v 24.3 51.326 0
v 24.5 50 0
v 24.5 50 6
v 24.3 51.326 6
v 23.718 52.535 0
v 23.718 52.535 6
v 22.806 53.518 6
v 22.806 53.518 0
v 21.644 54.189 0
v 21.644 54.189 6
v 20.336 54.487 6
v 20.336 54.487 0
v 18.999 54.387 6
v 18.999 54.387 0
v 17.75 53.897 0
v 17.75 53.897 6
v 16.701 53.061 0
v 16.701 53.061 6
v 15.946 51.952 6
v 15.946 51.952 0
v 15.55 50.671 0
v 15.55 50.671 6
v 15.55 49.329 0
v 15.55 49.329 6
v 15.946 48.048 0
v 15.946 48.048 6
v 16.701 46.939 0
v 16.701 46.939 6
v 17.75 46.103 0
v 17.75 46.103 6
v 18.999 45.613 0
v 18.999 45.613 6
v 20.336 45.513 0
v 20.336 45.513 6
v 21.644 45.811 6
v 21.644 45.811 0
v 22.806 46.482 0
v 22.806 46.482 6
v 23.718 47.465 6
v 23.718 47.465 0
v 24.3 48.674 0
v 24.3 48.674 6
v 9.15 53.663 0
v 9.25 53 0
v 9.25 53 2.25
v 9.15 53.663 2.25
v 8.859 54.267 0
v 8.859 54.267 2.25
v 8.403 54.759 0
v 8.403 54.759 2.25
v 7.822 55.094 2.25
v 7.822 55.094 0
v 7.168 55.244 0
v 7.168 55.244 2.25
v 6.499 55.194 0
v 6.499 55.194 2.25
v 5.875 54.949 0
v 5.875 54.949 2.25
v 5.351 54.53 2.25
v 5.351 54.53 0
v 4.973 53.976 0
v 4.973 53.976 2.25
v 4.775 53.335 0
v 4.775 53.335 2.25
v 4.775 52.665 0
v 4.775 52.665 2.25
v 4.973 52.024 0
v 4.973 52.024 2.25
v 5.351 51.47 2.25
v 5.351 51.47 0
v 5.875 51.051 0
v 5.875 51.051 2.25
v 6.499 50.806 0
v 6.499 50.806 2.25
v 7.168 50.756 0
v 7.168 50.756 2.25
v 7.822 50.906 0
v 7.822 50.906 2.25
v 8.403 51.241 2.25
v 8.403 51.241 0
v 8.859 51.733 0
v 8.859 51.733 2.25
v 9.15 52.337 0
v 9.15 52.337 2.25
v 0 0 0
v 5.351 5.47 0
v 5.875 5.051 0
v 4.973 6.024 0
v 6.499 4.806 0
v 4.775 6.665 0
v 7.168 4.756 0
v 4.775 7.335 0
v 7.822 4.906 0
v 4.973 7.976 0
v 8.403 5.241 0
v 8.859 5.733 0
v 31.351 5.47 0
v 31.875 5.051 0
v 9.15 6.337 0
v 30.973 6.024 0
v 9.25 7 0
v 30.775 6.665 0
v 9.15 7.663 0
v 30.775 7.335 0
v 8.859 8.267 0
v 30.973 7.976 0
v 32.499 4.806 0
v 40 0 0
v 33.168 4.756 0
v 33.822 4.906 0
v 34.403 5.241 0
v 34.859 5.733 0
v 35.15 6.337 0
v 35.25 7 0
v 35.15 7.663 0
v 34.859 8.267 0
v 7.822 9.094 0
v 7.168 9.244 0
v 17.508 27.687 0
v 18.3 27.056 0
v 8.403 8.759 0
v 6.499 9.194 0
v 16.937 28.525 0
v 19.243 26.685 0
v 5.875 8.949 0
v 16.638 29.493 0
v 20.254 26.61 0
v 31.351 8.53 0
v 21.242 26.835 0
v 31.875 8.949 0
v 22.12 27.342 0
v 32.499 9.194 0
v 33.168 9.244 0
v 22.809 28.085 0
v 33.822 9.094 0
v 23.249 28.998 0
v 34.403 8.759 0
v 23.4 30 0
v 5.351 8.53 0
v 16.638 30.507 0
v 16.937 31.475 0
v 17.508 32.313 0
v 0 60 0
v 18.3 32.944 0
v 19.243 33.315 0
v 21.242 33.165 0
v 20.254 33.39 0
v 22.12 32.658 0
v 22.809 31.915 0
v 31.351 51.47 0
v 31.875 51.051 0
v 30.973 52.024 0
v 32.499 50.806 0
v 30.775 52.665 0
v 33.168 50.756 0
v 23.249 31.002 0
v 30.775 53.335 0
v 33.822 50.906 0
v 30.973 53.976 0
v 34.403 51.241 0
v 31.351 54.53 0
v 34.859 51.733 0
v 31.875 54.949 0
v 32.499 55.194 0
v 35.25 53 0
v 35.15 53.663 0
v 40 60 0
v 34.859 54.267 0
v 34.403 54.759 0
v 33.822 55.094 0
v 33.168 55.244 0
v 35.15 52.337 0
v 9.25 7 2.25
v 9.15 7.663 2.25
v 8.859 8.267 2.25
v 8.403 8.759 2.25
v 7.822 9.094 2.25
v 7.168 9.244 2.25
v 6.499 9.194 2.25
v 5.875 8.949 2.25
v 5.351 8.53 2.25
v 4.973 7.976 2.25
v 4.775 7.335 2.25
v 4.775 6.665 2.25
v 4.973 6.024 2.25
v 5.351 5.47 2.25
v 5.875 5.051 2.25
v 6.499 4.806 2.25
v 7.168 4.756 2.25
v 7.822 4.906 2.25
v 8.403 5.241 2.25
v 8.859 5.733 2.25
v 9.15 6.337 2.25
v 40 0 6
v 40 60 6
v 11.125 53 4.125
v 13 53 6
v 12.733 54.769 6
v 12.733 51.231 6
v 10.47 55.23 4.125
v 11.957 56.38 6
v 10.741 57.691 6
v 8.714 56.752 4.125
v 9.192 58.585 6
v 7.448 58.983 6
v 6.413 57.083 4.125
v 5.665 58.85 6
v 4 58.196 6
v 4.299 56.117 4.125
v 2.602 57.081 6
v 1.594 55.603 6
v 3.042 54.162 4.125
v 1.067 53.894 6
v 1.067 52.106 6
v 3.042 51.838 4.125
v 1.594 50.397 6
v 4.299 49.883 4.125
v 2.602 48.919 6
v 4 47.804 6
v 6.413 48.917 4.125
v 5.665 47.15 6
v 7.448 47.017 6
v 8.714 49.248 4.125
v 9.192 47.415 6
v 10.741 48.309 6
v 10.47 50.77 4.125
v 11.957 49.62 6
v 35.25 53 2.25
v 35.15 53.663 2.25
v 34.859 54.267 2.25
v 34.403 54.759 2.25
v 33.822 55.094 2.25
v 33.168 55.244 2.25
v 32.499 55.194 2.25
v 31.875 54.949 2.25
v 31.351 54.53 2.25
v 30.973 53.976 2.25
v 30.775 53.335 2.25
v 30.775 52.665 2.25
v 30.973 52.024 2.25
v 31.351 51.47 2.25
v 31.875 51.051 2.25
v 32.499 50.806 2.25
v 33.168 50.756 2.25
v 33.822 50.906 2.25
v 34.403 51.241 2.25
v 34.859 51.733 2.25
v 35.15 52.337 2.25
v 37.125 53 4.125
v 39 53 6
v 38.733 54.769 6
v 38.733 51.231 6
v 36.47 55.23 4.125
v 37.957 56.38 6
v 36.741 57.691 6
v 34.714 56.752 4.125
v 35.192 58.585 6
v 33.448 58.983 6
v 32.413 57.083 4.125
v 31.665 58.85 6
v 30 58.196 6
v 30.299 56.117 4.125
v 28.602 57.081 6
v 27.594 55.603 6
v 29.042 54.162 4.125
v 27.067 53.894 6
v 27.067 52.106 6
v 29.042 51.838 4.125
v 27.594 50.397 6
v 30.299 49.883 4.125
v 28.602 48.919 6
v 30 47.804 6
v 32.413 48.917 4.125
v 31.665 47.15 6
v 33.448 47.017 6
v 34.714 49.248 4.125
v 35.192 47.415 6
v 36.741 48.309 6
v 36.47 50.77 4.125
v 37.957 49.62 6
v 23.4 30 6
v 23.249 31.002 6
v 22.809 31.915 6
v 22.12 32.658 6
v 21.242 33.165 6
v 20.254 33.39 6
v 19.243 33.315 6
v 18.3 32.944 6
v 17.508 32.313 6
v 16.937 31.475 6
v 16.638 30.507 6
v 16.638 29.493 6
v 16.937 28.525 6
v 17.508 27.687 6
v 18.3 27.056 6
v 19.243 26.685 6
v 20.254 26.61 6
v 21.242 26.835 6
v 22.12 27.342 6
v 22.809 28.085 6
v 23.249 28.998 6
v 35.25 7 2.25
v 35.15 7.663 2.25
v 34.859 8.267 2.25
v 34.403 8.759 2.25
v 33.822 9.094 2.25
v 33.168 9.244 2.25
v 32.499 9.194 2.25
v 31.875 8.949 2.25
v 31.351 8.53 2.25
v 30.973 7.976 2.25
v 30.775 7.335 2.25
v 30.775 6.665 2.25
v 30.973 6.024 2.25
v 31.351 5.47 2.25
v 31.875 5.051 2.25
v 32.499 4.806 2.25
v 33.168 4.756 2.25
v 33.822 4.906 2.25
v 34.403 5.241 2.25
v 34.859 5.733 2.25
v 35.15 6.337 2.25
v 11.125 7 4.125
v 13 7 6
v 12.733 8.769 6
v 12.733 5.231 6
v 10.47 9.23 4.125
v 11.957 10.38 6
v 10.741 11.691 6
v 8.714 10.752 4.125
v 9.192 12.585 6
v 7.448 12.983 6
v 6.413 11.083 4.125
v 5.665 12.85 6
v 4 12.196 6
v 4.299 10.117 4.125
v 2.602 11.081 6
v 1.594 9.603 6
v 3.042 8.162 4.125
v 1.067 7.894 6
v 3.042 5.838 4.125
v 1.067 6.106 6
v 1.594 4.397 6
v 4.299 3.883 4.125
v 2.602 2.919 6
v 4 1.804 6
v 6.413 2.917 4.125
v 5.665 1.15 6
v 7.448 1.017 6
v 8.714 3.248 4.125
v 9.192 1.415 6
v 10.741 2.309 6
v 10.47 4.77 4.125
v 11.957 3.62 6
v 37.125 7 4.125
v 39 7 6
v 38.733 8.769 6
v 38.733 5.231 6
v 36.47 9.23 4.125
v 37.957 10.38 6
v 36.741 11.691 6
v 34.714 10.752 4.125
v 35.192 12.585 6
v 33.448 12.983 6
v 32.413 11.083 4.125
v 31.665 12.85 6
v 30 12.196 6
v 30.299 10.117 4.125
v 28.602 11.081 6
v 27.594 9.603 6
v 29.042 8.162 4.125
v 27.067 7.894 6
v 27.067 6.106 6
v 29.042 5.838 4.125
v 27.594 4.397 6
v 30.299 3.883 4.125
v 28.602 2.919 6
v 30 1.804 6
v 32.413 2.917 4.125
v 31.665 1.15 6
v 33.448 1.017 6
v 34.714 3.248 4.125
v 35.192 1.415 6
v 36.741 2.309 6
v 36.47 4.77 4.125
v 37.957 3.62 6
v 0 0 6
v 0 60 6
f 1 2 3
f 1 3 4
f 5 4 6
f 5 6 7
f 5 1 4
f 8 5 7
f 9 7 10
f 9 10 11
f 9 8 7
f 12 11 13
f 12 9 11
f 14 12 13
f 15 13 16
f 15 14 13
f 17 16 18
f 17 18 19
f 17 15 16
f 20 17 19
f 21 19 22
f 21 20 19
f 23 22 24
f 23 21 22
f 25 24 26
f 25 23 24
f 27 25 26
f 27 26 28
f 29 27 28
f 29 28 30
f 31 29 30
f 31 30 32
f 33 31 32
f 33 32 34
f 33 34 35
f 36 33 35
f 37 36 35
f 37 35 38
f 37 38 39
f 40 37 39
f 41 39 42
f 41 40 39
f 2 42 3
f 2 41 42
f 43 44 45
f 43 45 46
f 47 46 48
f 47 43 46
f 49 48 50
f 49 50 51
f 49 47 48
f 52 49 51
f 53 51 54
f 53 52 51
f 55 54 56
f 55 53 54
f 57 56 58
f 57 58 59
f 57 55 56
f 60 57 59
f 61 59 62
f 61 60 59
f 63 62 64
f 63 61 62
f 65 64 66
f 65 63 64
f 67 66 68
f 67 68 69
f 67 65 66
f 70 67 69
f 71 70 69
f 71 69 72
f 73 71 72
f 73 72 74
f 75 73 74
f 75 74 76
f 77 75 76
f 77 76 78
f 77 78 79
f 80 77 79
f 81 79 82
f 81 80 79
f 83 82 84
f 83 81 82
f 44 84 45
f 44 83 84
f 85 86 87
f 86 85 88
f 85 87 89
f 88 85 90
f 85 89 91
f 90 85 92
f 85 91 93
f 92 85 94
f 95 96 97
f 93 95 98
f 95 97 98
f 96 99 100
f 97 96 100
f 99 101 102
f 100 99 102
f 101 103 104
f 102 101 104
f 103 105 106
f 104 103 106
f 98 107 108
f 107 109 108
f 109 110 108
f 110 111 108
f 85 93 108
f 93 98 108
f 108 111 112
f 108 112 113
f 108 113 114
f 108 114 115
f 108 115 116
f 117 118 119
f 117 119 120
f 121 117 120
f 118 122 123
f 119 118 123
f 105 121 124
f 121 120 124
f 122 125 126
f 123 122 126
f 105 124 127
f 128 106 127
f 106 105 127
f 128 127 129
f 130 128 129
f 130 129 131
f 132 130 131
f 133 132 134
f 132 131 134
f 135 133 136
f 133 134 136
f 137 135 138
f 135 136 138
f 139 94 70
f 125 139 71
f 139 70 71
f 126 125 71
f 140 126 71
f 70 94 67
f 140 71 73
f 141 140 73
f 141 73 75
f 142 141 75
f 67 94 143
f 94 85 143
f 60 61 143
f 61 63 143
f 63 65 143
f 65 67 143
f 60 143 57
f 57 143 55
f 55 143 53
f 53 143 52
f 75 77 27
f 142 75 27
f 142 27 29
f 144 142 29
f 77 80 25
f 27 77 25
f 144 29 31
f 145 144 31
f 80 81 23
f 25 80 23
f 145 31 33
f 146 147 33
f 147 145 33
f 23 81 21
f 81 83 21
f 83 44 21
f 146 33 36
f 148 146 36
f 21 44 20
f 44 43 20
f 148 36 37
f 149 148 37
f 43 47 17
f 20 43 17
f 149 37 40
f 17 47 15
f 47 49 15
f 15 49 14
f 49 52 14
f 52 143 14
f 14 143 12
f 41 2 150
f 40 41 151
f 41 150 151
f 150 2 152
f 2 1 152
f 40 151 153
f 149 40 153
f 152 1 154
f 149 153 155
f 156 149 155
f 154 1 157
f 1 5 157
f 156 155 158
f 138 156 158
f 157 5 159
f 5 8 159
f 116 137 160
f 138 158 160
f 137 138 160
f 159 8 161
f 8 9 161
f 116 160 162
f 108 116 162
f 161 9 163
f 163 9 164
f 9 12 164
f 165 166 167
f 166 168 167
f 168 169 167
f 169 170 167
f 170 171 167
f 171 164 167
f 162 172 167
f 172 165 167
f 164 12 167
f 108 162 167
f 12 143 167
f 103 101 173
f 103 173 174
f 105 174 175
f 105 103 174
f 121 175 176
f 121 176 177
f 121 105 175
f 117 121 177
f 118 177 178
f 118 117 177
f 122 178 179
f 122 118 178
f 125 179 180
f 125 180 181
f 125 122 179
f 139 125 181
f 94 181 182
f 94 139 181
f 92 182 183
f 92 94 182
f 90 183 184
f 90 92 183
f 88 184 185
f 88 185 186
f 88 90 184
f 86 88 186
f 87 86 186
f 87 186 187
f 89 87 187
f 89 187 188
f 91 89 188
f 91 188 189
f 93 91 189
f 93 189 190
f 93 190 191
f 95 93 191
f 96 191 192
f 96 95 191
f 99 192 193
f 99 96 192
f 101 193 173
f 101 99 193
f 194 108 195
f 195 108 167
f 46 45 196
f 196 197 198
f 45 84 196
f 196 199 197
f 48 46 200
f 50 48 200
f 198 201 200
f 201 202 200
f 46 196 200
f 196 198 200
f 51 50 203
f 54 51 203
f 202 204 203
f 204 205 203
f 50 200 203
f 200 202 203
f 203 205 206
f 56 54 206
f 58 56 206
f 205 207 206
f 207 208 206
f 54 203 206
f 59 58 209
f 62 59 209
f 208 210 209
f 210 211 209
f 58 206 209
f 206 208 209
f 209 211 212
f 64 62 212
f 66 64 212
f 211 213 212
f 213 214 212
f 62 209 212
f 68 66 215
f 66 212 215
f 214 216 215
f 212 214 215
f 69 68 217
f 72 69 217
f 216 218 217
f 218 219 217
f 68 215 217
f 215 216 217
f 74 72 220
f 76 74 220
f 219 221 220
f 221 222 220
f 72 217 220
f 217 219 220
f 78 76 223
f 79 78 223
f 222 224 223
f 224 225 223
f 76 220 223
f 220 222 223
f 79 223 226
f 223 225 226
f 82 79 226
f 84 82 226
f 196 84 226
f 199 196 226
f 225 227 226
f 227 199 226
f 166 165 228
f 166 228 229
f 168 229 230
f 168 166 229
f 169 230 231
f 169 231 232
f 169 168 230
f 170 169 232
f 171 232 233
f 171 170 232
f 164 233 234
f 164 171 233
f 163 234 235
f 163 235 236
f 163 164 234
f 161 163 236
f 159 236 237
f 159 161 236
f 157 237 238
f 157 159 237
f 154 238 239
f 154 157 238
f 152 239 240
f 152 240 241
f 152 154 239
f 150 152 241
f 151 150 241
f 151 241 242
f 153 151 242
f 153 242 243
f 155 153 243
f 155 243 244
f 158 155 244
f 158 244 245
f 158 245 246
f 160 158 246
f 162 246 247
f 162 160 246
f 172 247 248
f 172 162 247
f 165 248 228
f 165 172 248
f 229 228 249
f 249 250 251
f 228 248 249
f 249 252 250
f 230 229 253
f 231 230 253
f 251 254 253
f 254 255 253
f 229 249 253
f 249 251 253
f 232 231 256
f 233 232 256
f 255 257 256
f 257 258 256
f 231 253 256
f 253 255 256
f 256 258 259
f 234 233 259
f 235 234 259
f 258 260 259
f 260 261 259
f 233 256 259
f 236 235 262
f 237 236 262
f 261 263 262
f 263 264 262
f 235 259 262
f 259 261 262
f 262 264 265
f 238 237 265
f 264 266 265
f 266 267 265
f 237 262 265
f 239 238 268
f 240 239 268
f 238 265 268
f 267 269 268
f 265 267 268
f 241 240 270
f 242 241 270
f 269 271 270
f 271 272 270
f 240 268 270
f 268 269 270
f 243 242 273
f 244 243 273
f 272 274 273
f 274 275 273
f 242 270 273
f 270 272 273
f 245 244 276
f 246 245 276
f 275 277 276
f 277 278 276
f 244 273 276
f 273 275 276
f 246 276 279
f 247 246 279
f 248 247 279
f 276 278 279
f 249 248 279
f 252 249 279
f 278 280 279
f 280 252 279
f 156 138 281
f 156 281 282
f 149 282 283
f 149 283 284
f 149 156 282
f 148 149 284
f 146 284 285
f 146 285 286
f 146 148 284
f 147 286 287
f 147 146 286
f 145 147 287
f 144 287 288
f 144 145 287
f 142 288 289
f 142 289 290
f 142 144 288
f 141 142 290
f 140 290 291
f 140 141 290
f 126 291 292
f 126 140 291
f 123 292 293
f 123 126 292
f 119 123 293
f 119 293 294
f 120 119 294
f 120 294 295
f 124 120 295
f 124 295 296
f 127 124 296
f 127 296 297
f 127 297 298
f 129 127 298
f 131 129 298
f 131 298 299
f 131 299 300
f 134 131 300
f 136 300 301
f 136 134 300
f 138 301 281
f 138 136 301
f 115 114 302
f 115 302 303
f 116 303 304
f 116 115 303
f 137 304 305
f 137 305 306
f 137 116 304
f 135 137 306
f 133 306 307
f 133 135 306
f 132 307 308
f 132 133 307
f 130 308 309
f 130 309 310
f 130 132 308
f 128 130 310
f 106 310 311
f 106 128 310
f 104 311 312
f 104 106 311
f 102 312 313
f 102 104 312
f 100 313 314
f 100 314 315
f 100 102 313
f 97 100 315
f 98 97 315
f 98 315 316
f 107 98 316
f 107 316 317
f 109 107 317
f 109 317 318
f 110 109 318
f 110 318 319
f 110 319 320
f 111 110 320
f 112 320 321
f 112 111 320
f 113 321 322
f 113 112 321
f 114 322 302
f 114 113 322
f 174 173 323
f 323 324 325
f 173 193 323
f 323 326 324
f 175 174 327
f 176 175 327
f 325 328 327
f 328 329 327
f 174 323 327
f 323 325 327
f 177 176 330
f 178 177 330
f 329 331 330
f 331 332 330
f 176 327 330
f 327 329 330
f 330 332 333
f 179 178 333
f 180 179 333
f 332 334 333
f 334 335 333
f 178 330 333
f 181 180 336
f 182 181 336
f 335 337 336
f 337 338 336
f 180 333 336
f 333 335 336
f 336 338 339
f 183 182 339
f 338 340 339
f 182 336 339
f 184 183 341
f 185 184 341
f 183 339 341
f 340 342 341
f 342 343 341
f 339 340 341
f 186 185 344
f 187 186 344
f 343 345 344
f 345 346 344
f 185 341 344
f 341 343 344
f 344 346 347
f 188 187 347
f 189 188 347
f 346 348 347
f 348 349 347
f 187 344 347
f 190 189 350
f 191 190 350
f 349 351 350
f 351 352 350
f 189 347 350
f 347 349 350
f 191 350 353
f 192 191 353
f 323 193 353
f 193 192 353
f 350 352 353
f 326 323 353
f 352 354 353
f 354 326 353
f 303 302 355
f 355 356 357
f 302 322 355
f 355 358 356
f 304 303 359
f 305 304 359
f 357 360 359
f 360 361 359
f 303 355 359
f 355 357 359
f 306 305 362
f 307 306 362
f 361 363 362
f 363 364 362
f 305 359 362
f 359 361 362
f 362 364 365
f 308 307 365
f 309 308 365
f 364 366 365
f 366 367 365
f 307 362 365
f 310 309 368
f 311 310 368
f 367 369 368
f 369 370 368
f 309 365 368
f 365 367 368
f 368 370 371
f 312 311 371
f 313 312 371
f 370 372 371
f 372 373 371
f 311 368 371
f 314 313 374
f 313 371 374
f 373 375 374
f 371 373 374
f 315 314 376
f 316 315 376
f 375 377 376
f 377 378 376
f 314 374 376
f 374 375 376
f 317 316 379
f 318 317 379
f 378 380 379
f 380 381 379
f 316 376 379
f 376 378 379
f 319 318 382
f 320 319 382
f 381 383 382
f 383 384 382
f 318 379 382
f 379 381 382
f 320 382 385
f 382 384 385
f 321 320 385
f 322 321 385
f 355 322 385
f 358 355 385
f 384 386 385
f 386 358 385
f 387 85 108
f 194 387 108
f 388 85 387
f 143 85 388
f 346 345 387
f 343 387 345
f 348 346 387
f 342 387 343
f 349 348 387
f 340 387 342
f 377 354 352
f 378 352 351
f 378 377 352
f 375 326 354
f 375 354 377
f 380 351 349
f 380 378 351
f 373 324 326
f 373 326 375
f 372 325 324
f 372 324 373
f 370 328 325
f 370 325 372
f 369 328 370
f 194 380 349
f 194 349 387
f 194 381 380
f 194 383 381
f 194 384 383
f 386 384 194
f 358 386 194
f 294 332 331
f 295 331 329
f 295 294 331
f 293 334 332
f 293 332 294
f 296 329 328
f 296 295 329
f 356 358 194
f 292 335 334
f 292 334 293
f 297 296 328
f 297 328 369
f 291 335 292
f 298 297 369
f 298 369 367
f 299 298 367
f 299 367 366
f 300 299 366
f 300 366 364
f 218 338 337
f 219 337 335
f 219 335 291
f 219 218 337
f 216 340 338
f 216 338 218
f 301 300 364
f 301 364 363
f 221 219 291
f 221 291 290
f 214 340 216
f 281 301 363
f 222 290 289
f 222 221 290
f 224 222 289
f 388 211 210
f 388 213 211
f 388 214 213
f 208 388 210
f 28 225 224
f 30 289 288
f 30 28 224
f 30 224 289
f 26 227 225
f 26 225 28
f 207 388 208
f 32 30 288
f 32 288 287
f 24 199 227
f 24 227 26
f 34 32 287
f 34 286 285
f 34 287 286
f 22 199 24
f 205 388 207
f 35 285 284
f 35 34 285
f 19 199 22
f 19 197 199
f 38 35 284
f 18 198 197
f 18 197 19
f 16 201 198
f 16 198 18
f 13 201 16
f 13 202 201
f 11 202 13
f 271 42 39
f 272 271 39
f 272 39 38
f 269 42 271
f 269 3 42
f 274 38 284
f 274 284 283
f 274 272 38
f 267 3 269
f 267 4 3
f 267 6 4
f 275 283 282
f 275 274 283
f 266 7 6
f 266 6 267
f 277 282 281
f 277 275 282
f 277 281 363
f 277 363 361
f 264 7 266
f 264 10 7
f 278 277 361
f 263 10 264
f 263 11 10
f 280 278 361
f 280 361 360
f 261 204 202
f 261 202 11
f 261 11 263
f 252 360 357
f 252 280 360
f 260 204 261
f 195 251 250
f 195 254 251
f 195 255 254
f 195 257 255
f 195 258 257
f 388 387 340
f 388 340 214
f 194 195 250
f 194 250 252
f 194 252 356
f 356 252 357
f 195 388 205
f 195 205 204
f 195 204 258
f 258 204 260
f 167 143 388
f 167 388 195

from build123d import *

# Parameters (mm, degrees)
F0_W     = 40
F0_H     = 60
F0_R     = 2.25
F0_R_2   = 3.4
F0_R_3   = 4.5
F1_DEPTH = 6
F2_SIZE  = 3.75


with BuildPart() as f1:
    # F0 (on Top) → F1 (new body)
    with BuildSketch(Plane.XY):
        with Locations((20, 30)):
            Rectangle(F0_W, F0_H)
        with Locations((7, 7)):
            Circle(F0_R, mode=Mode.SUBTRACT)
        with Locations((33, 7)):
            Circle(F0_R, mode=Mode.SUBTRACT)
        with Locations((7, 53)):
            Circle(F0_R, mode=Mode.SUBTRACT)
        with Locations((20, 30)):
            Circle(F0_R_2, mode=Mode.SUBTRACT)
        with Locations((20, 50)):
            Circle(F0_R_3, mode=Mode.SUBTRACT)
        with Locations((33, 53)):
            Circle(F0_R, mode=Mode.SUBTRACT)
    extrude(amount=F1_DEPTH)

    # F2
    f2_edges = [f1.edges().sort_by_distance(p)[0] for p in [
        (4.75, 7, 6),
        (30.75, 7, 6),
        (30.75, 53, 6),
        (4.75, 53, 6),
    ]]
    chamfer(f2_edges, length=F2_SIZE)


solid = f1.part
